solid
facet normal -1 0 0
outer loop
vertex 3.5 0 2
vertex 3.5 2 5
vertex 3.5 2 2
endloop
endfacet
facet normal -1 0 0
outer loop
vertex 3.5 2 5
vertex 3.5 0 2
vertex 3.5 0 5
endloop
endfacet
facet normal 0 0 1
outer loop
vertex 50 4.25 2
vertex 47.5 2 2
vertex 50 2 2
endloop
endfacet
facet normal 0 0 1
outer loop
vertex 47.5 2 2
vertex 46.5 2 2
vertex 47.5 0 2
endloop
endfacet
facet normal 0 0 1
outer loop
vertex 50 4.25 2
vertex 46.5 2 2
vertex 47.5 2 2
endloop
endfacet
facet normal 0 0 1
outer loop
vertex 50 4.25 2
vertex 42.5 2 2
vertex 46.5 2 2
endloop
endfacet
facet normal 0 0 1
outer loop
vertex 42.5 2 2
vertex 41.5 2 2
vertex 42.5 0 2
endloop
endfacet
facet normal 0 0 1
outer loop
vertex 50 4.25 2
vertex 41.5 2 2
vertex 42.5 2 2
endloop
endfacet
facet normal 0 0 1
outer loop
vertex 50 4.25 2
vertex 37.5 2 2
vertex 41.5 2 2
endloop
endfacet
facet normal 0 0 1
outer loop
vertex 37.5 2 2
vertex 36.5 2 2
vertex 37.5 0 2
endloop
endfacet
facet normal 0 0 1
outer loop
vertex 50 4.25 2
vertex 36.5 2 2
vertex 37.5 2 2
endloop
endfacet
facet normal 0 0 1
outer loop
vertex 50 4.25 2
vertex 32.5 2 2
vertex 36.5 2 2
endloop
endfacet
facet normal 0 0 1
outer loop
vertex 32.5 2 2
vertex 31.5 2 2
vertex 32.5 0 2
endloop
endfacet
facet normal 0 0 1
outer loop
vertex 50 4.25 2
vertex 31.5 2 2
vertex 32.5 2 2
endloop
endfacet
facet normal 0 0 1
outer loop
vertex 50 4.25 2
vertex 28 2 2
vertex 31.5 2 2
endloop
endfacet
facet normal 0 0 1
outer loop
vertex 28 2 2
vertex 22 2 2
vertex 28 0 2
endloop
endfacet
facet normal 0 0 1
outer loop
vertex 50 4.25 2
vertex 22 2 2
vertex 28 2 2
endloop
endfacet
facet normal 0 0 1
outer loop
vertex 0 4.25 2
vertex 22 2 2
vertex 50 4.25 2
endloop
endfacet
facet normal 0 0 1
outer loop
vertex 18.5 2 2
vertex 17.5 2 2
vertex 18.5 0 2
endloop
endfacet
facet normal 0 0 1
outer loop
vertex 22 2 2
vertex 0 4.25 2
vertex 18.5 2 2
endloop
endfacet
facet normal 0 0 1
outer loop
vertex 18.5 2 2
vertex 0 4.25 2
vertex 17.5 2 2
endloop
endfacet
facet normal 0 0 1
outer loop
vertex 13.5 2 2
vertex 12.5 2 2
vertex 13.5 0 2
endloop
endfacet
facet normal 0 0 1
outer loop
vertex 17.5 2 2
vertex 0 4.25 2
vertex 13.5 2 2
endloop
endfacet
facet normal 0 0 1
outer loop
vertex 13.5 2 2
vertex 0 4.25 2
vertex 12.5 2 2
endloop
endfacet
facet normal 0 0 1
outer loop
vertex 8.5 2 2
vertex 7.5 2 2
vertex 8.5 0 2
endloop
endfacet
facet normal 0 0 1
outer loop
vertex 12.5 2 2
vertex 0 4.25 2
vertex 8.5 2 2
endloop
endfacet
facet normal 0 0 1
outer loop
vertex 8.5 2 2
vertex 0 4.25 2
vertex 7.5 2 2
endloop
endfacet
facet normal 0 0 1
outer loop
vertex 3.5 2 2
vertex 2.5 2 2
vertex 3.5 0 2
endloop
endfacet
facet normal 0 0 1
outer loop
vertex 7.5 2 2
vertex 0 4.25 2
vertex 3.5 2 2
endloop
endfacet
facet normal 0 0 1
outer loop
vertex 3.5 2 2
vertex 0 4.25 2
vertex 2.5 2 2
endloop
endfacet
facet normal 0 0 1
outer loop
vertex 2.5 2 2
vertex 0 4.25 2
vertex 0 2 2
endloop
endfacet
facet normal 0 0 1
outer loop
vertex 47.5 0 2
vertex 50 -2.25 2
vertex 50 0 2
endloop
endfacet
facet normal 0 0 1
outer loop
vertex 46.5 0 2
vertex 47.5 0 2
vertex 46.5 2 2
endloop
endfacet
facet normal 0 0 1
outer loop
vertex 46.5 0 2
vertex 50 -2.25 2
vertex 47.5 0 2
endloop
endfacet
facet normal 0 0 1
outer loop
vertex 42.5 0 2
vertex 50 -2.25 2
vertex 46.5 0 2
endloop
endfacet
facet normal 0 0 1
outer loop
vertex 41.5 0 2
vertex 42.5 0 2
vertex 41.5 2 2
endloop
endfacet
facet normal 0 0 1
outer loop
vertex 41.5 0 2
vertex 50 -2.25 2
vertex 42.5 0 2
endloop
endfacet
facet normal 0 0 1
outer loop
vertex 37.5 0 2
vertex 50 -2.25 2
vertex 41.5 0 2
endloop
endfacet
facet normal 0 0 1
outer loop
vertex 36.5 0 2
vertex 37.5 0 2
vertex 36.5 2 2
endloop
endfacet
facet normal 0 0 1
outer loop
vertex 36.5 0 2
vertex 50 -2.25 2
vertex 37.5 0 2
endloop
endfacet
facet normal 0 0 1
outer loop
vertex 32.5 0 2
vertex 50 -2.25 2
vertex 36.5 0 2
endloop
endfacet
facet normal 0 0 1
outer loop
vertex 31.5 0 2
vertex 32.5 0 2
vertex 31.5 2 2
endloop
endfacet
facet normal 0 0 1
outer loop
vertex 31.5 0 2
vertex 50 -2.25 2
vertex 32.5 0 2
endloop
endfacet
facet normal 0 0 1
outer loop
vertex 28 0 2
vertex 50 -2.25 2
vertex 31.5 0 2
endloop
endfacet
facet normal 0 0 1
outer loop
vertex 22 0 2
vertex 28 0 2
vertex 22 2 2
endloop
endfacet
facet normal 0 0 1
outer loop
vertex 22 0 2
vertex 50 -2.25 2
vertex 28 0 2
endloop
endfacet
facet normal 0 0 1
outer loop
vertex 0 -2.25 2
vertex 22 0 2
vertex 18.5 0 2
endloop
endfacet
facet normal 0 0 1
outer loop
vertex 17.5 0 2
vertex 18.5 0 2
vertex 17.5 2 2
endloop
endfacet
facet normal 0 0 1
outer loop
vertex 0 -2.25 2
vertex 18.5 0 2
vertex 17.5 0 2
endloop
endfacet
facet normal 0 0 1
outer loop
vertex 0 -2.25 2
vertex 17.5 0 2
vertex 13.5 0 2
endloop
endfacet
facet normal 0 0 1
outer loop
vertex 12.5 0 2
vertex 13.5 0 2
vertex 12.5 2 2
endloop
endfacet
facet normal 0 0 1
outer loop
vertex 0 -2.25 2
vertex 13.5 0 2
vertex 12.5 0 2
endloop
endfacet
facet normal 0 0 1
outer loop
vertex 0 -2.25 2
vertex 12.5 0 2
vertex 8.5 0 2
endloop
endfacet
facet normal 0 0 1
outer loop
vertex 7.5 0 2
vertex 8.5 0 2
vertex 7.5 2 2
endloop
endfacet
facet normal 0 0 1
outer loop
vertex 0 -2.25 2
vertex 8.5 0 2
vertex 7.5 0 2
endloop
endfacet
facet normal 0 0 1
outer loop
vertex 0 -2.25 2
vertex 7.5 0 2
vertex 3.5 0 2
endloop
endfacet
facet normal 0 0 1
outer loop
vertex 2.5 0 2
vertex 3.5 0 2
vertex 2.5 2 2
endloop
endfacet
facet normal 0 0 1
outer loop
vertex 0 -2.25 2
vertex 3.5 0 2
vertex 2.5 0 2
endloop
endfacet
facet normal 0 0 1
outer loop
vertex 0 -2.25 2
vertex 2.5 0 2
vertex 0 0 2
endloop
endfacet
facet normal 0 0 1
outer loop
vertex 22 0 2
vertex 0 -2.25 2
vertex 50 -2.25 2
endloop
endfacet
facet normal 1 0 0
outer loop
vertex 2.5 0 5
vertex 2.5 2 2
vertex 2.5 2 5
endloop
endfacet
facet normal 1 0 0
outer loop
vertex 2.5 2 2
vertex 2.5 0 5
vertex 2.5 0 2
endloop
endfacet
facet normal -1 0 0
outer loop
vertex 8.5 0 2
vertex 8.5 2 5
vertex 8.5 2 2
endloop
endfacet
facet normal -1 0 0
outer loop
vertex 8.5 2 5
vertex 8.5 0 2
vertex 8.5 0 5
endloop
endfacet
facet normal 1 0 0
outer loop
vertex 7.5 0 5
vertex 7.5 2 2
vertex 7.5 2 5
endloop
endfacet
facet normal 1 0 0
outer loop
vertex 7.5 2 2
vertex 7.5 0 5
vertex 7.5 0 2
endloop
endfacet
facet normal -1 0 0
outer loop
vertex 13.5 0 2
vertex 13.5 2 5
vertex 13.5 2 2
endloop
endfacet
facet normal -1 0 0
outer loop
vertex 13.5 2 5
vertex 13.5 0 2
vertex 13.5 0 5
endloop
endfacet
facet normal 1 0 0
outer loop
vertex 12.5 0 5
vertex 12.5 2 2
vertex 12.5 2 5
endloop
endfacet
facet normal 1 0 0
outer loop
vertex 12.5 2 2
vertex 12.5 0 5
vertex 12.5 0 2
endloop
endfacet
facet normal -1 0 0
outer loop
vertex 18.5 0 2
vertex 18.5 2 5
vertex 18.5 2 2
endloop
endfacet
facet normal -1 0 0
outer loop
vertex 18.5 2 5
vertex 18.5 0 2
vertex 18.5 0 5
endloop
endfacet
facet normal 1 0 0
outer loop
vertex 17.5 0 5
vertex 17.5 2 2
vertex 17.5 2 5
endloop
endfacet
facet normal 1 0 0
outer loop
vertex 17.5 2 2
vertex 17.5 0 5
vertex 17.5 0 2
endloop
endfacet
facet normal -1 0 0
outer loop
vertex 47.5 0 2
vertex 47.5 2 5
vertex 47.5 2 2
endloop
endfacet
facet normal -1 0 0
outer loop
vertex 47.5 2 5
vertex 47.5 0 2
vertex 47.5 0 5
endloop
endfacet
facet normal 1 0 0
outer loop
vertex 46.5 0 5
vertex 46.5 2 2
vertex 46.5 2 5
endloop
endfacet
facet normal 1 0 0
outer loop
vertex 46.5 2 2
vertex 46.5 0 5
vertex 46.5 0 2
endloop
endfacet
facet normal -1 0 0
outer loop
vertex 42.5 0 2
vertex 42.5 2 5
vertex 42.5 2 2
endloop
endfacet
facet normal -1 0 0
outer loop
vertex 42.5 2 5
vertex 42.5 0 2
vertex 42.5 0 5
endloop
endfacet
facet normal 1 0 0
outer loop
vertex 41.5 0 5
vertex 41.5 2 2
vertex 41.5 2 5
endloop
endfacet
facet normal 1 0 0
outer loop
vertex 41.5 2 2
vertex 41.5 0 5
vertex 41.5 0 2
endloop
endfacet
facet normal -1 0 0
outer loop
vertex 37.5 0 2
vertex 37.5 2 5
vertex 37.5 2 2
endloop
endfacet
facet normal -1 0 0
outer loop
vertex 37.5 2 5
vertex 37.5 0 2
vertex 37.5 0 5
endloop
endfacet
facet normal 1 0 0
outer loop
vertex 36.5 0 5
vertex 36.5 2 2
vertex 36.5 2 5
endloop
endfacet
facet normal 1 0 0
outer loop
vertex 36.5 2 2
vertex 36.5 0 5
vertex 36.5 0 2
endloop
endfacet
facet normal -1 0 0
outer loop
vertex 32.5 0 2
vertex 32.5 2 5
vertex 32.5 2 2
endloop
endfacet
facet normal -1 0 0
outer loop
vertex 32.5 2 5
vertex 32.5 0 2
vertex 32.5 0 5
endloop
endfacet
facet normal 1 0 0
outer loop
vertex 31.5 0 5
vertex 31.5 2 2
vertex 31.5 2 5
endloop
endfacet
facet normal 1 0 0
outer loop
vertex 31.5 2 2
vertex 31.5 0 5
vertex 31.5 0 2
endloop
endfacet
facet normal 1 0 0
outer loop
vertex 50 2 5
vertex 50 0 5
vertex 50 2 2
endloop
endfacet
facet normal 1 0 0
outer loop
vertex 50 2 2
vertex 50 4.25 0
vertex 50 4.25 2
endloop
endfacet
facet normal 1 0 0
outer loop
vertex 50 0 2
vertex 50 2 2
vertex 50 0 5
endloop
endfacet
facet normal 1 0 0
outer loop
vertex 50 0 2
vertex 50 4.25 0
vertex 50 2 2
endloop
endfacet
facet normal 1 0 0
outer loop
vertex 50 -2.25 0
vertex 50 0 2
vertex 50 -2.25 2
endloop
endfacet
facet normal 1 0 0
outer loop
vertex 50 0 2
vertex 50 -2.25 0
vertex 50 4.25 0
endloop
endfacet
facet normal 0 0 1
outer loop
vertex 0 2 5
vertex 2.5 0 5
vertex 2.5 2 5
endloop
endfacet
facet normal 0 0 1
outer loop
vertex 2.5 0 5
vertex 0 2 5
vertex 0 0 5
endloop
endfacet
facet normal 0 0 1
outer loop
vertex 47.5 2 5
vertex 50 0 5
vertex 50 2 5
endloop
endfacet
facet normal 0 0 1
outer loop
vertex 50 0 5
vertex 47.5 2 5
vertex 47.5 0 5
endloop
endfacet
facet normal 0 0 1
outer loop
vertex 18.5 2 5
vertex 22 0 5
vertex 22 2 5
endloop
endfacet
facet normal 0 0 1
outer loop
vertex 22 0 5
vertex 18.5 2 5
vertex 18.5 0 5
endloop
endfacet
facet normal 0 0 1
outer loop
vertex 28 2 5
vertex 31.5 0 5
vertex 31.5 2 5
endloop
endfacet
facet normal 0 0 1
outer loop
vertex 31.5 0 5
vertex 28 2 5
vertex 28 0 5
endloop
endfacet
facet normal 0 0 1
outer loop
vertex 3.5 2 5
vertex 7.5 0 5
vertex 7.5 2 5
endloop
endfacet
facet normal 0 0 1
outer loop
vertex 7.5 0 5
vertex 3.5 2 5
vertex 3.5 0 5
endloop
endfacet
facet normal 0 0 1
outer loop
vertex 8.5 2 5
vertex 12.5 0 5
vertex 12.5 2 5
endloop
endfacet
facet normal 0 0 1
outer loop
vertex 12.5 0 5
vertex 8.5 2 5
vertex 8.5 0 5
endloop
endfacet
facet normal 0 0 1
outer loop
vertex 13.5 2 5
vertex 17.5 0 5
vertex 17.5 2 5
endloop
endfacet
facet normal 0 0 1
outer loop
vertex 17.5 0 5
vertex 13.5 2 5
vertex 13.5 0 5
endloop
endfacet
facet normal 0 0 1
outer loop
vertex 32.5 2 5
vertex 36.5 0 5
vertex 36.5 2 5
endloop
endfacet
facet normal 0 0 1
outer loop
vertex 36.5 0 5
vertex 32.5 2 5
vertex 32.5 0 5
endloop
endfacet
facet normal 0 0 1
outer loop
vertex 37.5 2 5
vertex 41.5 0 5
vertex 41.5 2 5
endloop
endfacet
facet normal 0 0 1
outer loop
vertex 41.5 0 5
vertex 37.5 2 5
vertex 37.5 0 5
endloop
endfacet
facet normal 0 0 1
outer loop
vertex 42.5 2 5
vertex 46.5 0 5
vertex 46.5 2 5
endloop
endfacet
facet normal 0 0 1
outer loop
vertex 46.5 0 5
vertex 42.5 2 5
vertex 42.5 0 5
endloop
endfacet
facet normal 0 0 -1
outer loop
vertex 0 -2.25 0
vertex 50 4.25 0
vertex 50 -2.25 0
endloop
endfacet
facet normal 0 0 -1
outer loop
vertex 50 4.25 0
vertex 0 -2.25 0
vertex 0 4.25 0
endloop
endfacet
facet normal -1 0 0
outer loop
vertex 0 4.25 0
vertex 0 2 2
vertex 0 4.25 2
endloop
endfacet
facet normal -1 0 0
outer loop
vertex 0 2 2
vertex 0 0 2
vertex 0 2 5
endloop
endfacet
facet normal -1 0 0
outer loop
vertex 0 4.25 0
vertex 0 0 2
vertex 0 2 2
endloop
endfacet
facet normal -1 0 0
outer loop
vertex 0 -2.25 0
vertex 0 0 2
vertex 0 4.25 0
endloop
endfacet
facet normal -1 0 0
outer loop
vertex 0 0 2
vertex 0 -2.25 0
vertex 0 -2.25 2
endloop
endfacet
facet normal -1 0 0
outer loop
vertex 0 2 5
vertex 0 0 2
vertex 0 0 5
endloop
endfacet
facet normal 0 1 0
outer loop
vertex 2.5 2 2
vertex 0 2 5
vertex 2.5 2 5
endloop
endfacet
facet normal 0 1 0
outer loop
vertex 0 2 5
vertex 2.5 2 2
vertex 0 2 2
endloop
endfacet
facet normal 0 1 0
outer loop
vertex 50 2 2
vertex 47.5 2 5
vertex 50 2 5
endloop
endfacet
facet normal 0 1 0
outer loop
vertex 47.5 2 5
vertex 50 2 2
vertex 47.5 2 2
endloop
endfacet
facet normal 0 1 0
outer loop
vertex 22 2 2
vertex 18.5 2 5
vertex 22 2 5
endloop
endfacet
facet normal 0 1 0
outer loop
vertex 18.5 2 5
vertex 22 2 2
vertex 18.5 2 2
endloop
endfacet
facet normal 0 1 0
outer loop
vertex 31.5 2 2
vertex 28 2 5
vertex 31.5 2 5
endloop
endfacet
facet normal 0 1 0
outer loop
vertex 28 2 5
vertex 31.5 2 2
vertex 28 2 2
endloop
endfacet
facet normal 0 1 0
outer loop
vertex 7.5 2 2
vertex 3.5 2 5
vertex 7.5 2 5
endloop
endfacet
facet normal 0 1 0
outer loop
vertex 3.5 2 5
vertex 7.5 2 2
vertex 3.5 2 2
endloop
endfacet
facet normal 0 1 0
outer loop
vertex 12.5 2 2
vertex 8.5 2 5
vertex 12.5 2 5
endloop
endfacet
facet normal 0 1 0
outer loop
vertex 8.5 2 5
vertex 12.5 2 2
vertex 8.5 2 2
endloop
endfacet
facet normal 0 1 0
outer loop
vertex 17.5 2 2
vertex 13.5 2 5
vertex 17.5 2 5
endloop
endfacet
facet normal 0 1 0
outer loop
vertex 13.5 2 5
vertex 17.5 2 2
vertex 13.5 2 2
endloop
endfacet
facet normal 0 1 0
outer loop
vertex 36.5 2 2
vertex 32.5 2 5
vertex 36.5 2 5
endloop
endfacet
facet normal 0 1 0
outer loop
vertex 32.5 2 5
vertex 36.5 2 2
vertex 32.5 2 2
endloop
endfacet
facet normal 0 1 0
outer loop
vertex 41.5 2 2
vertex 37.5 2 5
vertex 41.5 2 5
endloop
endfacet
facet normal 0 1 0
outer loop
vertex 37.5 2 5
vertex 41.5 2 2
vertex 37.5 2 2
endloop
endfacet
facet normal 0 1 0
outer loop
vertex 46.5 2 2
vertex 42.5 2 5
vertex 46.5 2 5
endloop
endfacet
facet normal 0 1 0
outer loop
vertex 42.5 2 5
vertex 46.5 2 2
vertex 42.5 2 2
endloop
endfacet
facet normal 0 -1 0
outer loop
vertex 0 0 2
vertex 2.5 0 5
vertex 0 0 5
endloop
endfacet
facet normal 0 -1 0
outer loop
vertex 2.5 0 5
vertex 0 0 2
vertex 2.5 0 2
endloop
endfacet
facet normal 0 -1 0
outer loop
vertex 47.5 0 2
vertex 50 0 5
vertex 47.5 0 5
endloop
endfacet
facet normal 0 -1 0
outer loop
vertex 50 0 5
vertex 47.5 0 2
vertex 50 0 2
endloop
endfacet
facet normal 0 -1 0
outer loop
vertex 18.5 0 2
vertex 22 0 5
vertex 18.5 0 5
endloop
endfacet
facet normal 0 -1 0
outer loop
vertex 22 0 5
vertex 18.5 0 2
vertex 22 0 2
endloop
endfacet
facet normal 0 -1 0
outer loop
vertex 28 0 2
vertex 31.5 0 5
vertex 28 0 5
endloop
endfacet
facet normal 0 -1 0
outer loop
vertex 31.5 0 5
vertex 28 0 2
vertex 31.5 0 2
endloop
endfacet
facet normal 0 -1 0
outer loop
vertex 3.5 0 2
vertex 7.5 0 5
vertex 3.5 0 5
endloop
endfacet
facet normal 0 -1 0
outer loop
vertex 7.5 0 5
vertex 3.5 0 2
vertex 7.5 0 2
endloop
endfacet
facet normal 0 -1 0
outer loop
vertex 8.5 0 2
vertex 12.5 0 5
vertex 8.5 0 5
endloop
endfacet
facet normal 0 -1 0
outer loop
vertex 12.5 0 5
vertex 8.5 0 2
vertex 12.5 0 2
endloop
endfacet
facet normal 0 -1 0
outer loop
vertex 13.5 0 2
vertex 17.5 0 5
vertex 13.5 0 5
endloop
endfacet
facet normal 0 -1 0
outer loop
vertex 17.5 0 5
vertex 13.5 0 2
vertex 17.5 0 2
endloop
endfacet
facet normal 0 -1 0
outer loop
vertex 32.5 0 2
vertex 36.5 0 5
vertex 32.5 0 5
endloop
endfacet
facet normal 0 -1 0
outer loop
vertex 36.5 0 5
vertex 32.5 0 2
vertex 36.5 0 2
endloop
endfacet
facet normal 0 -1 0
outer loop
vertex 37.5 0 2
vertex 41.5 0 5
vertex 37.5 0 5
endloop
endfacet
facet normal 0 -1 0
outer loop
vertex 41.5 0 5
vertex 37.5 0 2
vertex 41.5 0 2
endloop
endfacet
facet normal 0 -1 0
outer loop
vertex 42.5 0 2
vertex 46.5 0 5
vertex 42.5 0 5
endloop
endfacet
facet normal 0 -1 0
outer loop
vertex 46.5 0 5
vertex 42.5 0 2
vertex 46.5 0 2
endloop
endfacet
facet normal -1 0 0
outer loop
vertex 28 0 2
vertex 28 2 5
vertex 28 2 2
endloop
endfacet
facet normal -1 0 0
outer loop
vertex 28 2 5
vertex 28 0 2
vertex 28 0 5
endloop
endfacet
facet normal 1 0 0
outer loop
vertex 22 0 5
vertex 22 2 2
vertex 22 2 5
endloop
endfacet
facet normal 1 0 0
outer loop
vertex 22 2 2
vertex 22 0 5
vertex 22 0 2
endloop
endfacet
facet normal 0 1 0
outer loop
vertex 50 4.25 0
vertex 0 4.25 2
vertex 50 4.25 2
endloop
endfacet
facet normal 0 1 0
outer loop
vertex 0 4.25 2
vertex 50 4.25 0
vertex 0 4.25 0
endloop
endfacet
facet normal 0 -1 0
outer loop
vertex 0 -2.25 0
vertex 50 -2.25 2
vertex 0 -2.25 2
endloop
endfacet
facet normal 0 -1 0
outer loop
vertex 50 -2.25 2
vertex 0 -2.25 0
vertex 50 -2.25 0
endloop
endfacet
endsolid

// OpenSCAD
module end_stick()
{
    union(){
        // Main body of the part
        length = 50;
        width = 2;
        height = 5;
        base_height = 2;
        void_length = 6;
        difference() {
            cube(size=[length,width,height]);
            void_x = (length - void_length)/2;
            translate([void_x,-1,base_height]) cube(size=[void_length,5,10]);
            term_voids = 4;
            term_void_length = (length-10)/(2*term_voids);
            for(i=[1:term_voids]){
                translate([term_void_length*i-term_void_length/2,-1,base_height]) cube(size=[1,5,10]);
            }
            for(i=[1:term_voids]){
                translate([length-(term_void_length*i-term_void_length/2)-1,-1,base_height]) cube(size=[1,5,10]);
            }
        }
        
        // Base
        translate([0,-2.25,0]) cube(size=[50,6.5,2]);
    }
    
}

end_stick();
